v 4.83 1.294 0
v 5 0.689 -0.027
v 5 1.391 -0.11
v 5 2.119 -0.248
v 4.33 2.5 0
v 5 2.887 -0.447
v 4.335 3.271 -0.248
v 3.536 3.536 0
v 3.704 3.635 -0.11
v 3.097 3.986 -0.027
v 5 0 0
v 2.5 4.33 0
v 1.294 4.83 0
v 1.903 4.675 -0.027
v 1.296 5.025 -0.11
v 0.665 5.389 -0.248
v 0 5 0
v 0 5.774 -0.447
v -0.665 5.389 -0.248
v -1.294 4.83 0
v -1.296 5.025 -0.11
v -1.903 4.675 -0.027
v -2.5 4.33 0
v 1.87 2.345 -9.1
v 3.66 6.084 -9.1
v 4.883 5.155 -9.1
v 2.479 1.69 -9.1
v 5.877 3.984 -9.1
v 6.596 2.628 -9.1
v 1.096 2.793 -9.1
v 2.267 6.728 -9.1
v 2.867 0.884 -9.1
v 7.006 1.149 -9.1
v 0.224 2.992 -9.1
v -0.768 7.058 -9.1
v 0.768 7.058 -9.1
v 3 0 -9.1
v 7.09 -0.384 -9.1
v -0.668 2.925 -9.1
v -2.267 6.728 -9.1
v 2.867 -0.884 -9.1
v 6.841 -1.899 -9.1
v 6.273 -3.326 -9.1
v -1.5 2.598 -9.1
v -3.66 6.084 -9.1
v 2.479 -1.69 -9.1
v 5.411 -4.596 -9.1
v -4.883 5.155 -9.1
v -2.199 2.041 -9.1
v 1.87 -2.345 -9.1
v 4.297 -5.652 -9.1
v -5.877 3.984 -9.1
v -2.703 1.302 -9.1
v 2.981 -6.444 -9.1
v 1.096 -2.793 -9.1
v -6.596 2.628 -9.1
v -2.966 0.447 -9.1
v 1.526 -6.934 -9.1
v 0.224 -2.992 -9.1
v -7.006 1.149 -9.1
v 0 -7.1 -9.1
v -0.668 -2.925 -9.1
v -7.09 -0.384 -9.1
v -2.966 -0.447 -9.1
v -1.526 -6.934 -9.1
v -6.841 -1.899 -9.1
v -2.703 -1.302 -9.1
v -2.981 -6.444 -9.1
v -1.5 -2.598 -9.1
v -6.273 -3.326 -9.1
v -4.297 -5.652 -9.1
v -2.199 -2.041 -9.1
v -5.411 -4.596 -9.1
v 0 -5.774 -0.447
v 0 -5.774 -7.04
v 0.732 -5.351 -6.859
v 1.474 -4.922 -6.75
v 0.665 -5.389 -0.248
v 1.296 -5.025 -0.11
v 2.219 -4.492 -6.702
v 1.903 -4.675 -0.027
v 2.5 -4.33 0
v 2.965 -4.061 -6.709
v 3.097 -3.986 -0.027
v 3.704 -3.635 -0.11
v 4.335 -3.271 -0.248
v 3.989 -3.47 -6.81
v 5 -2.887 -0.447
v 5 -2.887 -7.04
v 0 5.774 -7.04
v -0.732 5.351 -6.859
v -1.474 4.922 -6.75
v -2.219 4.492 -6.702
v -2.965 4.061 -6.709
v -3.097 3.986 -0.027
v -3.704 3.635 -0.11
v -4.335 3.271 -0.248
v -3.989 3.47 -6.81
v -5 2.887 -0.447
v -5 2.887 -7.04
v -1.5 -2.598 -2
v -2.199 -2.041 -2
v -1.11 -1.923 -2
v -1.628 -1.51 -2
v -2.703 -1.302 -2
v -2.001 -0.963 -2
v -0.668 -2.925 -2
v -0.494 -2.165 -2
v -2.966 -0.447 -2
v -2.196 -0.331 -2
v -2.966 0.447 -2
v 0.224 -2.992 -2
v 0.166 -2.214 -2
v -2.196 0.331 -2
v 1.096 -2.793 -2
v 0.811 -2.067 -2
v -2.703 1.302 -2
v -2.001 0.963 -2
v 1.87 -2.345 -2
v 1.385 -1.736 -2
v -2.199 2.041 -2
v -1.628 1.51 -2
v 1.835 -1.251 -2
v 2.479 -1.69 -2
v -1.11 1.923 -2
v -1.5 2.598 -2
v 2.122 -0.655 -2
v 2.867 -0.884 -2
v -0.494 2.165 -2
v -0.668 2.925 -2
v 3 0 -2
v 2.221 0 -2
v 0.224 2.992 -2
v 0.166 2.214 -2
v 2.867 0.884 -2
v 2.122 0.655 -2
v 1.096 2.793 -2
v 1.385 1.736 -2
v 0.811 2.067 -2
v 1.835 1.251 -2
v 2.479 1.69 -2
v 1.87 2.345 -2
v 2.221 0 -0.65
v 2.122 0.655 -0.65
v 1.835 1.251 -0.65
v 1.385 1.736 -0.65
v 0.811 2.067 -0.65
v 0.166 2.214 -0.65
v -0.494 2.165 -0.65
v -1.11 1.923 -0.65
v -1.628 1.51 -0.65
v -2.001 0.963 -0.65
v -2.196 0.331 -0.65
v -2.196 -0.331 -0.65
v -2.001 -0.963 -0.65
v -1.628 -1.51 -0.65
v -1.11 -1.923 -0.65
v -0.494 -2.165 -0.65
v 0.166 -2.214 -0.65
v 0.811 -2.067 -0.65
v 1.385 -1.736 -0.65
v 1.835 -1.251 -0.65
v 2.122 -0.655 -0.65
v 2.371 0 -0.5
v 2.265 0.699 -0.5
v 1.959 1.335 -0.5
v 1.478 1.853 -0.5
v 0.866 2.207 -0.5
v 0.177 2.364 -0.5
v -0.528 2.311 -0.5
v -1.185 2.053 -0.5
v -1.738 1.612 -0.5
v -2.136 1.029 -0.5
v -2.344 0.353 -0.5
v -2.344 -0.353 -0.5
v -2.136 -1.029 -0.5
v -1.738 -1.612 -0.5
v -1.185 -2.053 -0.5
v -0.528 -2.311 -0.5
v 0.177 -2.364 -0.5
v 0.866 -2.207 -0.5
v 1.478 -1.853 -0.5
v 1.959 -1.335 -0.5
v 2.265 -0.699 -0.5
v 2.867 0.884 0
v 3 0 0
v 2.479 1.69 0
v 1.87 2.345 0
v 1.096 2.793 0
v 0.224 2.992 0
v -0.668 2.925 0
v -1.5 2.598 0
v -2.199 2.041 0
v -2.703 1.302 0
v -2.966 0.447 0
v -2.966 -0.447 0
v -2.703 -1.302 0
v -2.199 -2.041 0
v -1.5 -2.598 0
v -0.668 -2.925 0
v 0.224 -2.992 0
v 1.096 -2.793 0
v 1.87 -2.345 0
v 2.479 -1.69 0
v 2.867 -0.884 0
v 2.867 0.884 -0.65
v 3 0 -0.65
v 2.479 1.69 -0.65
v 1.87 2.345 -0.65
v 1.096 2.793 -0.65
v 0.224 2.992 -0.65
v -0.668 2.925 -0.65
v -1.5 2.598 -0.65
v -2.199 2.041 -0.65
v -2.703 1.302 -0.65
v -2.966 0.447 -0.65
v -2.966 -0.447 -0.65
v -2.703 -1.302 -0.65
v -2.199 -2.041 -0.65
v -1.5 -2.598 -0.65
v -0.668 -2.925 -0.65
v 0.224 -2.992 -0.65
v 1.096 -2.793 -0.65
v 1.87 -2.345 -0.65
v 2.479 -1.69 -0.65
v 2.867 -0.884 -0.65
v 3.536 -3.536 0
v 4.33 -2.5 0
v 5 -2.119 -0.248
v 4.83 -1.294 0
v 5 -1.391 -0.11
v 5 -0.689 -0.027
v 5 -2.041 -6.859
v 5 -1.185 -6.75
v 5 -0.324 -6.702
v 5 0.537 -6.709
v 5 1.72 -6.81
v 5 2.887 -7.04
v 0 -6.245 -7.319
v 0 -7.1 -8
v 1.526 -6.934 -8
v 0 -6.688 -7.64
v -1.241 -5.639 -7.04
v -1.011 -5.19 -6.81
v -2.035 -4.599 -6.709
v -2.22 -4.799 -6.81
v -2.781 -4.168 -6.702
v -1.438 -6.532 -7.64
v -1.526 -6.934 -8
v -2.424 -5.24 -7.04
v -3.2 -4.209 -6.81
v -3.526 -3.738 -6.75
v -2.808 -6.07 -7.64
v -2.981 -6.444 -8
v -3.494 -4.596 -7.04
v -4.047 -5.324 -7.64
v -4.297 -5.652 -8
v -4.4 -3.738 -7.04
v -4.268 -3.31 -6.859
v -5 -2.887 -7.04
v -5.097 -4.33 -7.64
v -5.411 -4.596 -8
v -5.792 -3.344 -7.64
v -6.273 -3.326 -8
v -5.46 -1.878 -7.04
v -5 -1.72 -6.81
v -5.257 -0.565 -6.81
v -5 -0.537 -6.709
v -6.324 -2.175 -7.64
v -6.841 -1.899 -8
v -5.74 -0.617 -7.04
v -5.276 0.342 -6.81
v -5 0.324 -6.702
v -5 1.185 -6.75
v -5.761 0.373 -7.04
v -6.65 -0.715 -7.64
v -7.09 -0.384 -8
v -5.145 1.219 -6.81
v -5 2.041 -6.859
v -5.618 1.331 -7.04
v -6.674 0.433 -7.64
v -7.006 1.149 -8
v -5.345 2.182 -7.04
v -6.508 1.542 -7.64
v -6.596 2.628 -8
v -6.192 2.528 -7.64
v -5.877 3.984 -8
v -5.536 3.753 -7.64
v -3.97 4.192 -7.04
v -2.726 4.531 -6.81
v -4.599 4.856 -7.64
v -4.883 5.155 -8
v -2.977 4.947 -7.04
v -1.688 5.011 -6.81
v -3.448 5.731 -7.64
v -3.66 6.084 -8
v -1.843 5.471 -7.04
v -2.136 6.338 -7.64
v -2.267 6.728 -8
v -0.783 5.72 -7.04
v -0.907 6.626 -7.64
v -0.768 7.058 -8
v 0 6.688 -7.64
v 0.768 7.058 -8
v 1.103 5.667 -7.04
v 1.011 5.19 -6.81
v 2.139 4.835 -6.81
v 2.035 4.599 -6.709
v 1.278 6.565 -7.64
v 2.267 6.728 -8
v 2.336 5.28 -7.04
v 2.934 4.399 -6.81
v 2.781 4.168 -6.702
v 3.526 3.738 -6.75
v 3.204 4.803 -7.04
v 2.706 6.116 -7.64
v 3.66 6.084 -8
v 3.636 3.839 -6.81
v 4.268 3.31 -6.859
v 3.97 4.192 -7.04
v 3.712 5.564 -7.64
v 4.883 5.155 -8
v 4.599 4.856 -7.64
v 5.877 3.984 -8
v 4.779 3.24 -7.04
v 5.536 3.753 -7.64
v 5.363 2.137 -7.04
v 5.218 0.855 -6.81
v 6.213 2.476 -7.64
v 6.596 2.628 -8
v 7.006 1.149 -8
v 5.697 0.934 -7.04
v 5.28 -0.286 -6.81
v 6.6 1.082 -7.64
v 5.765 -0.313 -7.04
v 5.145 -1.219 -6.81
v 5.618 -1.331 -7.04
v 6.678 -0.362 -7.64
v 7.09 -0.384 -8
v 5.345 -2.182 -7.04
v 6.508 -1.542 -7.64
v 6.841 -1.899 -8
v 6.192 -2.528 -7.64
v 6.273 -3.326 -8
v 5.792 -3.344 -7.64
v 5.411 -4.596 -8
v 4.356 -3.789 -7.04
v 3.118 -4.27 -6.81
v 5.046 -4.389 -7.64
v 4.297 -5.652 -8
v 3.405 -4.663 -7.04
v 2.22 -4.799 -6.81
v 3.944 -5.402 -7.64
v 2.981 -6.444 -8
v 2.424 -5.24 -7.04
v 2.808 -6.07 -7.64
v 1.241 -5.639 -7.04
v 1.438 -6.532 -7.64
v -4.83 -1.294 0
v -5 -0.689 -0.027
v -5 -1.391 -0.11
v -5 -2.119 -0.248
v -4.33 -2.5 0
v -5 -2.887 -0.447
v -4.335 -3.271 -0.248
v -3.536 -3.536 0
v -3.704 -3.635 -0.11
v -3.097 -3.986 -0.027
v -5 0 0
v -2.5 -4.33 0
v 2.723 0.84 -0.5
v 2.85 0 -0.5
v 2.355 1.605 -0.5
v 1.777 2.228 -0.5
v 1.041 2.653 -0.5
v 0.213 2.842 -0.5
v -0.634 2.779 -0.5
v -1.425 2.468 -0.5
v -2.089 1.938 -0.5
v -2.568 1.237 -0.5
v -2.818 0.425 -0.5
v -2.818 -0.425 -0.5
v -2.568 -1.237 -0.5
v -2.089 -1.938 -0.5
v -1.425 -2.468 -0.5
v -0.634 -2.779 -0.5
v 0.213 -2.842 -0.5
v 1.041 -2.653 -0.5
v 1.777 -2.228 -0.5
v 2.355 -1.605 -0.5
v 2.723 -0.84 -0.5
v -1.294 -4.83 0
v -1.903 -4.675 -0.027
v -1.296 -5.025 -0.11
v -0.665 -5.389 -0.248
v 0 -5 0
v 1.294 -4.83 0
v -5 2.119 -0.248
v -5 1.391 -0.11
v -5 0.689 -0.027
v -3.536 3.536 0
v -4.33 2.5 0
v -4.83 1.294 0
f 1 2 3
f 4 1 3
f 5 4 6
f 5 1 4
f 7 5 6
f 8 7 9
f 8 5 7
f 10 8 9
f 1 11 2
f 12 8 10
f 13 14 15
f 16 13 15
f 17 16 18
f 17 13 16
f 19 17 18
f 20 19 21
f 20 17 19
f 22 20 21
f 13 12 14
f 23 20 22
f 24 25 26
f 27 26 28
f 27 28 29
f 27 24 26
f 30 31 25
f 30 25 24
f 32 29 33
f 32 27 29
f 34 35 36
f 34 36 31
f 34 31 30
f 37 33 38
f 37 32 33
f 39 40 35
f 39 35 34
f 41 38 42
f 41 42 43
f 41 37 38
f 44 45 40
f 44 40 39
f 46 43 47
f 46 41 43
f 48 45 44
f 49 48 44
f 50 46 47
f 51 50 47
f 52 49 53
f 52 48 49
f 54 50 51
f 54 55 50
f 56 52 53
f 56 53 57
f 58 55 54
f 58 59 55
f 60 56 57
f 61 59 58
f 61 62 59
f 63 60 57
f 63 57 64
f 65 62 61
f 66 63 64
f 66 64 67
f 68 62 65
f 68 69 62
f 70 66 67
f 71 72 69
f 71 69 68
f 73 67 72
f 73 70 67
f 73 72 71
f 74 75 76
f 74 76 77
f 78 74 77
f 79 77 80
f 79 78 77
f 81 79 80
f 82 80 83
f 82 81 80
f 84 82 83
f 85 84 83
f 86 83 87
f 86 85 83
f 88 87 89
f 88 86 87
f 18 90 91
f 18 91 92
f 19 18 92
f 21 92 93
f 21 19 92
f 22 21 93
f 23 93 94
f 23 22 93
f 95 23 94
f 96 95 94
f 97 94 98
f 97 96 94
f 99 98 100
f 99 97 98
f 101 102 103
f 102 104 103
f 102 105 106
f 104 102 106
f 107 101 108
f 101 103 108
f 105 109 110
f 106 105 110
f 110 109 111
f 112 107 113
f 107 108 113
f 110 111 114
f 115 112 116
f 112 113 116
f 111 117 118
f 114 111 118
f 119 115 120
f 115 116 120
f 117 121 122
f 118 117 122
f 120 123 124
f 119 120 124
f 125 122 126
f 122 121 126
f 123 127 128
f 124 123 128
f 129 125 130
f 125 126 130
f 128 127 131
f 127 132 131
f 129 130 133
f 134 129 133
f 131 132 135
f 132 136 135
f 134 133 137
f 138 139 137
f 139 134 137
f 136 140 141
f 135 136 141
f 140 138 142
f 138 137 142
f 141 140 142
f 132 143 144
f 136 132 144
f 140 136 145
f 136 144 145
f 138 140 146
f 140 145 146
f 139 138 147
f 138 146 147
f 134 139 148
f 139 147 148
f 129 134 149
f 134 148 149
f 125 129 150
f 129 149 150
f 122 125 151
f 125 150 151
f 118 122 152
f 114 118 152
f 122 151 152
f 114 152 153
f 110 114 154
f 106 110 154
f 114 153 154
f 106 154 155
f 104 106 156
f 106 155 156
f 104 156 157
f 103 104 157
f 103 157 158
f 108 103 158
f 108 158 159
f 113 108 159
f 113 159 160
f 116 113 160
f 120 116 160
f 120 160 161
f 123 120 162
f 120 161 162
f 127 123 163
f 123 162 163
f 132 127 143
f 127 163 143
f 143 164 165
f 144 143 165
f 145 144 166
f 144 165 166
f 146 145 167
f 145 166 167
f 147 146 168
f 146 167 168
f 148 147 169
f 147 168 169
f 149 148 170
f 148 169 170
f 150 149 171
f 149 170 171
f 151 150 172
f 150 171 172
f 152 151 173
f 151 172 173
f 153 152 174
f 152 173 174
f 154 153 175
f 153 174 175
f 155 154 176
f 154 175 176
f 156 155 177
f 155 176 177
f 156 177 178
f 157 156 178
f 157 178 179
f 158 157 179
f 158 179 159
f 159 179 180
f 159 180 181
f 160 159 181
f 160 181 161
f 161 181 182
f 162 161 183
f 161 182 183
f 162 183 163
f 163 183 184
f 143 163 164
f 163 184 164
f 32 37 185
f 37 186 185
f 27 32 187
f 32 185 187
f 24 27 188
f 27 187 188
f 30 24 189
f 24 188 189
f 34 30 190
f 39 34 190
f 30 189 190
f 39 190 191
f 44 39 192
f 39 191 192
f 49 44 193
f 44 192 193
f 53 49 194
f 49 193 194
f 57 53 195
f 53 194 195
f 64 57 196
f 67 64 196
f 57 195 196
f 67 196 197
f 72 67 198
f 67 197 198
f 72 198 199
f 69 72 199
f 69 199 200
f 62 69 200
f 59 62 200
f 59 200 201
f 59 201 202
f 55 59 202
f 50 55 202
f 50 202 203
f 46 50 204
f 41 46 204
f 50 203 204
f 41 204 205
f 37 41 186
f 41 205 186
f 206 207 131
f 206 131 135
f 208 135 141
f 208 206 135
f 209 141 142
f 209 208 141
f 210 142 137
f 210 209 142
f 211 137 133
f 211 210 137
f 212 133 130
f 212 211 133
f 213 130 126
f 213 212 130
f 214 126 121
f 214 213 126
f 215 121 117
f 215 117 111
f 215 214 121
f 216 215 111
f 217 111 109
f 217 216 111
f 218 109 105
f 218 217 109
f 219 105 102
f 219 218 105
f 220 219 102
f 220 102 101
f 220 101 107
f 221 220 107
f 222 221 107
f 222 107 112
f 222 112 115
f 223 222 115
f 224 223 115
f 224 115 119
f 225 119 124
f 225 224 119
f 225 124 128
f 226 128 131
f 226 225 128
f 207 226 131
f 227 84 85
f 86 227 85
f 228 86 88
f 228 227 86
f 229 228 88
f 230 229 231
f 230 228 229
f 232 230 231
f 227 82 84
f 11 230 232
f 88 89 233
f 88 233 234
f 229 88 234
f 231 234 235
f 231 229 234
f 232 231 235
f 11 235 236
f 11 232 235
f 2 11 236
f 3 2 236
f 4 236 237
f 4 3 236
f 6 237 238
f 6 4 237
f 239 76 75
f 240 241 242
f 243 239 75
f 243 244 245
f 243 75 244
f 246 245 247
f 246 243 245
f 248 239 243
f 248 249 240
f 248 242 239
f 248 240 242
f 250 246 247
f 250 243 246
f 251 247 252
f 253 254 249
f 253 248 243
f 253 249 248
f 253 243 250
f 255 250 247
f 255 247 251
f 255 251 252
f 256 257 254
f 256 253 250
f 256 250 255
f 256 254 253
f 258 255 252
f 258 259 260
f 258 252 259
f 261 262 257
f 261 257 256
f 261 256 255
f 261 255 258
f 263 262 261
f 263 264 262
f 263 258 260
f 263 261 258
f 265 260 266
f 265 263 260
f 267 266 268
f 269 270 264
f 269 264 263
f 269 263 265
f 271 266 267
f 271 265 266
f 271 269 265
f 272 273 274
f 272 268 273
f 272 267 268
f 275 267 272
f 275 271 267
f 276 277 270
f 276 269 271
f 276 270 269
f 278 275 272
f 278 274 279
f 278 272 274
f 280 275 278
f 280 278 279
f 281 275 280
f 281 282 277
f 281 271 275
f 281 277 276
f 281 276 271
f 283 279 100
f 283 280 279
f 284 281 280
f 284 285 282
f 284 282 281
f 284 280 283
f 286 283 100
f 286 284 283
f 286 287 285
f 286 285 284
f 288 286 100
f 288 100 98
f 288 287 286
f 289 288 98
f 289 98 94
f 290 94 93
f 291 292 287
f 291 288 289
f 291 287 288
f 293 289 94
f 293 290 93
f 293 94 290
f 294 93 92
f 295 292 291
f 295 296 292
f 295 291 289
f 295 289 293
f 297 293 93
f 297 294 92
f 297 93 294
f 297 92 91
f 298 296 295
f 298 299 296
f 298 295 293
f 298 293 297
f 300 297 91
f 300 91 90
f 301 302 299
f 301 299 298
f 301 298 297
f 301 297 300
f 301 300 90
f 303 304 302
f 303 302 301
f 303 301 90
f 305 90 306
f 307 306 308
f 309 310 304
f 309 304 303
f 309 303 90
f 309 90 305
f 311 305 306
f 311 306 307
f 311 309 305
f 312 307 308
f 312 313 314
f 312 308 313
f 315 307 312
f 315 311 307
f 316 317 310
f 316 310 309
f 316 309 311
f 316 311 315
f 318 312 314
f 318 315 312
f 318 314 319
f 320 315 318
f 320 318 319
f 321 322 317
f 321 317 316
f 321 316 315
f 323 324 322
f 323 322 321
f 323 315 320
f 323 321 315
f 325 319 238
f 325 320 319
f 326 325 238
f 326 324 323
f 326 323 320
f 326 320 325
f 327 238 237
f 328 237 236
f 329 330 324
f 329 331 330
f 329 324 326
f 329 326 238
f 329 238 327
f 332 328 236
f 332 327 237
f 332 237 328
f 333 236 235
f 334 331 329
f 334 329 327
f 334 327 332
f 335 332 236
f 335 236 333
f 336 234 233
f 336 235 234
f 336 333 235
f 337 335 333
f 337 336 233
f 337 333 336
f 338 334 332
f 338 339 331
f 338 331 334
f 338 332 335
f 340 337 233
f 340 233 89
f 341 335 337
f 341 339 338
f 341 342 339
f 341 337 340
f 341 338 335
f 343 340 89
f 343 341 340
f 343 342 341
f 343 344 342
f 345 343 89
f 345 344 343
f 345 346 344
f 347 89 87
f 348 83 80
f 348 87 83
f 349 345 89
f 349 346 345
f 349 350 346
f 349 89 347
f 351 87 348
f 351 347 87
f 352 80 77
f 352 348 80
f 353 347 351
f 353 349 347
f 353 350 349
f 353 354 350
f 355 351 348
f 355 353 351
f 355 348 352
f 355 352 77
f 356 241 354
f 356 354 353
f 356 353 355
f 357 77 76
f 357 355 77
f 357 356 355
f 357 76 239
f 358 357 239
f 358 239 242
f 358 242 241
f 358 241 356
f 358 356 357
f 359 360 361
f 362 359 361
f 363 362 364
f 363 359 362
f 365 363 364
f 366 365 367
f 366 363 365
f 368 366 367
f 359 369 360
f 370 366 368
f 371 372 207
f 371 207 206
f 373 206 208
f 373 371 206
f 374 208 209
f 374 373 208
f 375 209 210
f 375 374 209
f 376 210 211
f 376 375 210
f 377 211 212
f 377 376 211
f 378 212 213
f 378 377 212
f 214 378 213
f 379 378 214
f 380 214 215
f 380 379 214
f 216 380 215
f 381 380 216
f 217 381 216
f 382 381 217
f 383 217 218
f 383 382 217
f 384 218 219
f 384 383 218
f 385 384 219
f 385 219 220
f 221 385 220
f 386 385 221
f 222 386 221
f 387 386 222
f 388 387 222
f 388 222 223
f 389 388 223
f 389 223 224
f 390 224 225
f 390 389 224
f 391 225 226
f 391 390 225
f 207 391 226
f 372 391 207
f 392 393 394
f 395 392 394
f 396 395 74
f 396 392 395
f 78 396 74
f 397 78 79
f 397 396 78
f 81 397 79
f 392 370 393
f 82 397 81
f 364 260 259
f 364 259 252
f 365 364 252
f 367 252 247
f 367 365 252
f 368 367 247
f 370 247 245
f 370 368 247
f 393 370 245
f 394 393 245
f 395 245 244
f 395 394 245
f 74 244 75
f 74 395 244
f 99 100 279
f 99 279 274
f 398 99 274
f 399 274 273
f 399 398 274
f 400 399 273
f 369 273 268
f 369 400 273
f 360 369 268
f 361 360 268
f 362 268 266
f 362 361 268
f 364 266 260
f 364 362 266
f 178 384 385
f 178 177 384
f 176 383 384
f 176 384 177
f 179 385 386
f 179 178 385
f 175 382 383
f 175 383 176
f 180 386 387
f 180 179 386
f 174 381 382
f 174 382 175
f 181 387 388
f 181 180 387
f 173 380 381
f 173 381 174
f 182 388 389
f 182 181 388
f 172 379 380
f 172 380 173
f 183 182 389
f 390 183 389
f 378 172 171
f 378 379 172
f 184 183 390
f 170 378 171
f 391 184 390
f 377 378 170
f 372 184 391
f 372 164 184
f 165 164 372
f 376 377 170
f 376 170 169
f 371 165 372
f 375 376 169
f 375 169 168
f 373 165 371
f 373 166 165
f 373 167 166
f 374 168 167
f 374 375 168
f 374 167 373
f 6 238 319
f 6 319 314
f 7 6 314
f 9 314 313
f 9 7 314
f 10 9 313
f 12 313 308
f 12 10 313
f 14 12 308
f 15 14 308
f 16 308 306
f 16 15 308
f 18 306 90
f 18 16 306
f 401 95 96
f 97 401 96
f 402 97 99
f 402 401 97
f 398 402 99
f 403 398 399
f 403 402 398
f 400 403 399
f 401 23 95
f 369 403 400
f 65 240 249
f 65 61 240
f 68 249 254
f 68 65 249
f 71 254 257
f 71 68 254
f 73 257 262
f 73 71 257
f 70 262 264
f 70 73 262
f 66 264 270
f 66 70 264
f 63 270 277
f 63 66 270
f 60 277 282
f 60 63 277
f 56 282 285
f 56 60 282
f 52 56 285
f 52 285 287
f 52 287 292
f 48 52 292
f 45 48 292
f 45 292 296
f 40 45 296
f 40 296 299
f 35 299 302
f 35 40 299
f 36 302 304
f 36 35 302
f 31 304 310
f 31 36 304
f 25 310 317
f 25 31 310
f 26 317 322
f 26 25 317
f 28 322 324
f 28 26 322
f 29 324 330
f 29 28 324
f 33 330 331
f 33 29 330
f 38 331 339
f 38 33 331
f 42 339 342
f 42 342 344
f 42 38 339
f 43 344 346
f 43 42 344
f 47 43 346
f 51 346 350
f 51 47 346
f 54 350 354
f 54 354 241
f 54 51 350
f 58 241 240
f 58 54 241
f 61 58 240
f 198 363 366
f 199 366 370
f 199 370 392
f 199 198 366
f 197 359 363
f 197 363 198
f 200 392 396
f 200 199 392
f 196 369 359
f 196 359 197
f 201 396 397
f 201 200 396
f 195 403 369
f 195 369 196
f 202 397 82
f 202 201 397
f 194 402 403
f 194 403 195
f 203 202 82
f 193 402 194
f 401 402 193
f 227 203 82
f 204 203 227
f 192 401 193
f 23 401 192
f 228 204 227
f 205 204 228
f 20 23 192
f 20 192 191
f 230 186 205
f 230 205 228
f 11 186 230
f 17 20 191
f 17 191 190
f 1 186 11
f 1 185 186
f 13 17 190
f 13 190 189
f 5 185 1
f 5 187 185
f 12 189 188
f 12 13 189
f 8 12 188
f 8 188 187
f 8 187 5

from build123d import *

# Parameters (mm, degrees)
SKETCH1_R           = 3
EXTRUDE1_DEPTH      = 9.1
SKETCH2_OUTSIDE_W   = 60.176
SKETCH2_OUTSIDE_H   = 61.724
SKETCH2_OUTSIDE_R   = 5
CUT_EXTRUDE1_DEPTH  = 12.880375976
CUT_EXTRUDE1_DRAFT  = -60
BOSS_EXTRUDE1_START = -0.5
SKETCH10_R          = 3
SKETCH10_R_2        = 2.220577137
BOSS_EXTRUDE1_DEPTH = 1.5
CHAMFER1_SIZE       = 0.15


with BuildPart() as part:
    # Sketch1 → Extrude1 (new body)
    with BuildSketch(Plane.XY):
        Polygon((0, 5.773502692), (-5, 2.886751346), (-5, -2.886751346), (0, -5.773502692), (5, -2.886751346), (5, 2.886751346), align=None)
        Circle(SKETCH1_R, mode=Mode.SUBTRACT)
    extrude(amount=-EXTRUDE1_DEPTH)


with BuildPart() as cut_extrude1_tool:
    # Sketch2 outside → Cut-Extrude1 (with draft: the straight prism first)
    with BuildSketch(Plane.XY):
        Rectangle(SKETCH2_OUTSIDE_W, SKETCH2_OUTSIDE_H)
        Circle(SKETCH2_OUTSIDE_R, mode=Mode.SUBTRACT)
    extrude(amount=-CUT_EXTRUDE1_DEPTH)
    # Cut-Extrude1: the draft: its side faces are tilted about the plane it starts from
    cut_extrude1_sides = [cut_extrude1_tool.faces().sort_by_distance(p)[0] for p in [
        (0, -30.862, -6.440187988),
        (30.088, 0, -6.440187988),
        (0, 30.862, -6.440187988),
        (-30.088, 0, -6.440187988),
        (-5, 0, -6.440187988),
    ]]
    draft(cut_extrude1_sides, Plane.XY, CUT_EXTRUDE1_DRAFT)


with BuildPart() as part_1:
    add(part.part)

    # Cut-Extrude1: cut by cut_extrude1_tool
    add(cut_extrude1_tool.part, mode=Mode.SUBTRACT)

    # Sketch3 → Revolve1 (revolve)
    with BuildSketch(Plane(origin=(0, 0, 0), x_dir=(0, 0, -1), z_dir=(1, 0, 0))):
        with BuildLine():
            Line((9.1, 7.1), (9.1, 3))
            Line((9.1, 3), (6.35, 3))
            ThreePointArc((6.35, 3), (6.777972398, 5.209779401), (8, 7.1))
            Line((8, 7.1), (9.1, 7.1))
        make_face()
    revolve(axis=Axis((0, 0, 0), (0, 0, -1)))


with BuildPart() as body_2:
    # Sketch10 → Boss-Extrude1 (new body)
    with BuildSketch(Plane.XY.offset(BOSS_EXTRUDE1_START)):
        Circle(SKETCH10_R)
        Circle(SKETCH10_R_2, mode=Mode.SUBTRACT)
    extrude(amount=-BOSS_EXTRUDE1_DEPTH)

    # Chamfer1
    chamfer1_edges = [body_2.edges().sort_by_distance(p)[0] for p in [
        (-3, 0, -0.5),
        (-2.220577137, 0, -0.5),
    ]]
    chamfer(chamfer1_edges, length=CHAMFER1_SIZE)


solid = Compound([part_1.part, body_2.part])
